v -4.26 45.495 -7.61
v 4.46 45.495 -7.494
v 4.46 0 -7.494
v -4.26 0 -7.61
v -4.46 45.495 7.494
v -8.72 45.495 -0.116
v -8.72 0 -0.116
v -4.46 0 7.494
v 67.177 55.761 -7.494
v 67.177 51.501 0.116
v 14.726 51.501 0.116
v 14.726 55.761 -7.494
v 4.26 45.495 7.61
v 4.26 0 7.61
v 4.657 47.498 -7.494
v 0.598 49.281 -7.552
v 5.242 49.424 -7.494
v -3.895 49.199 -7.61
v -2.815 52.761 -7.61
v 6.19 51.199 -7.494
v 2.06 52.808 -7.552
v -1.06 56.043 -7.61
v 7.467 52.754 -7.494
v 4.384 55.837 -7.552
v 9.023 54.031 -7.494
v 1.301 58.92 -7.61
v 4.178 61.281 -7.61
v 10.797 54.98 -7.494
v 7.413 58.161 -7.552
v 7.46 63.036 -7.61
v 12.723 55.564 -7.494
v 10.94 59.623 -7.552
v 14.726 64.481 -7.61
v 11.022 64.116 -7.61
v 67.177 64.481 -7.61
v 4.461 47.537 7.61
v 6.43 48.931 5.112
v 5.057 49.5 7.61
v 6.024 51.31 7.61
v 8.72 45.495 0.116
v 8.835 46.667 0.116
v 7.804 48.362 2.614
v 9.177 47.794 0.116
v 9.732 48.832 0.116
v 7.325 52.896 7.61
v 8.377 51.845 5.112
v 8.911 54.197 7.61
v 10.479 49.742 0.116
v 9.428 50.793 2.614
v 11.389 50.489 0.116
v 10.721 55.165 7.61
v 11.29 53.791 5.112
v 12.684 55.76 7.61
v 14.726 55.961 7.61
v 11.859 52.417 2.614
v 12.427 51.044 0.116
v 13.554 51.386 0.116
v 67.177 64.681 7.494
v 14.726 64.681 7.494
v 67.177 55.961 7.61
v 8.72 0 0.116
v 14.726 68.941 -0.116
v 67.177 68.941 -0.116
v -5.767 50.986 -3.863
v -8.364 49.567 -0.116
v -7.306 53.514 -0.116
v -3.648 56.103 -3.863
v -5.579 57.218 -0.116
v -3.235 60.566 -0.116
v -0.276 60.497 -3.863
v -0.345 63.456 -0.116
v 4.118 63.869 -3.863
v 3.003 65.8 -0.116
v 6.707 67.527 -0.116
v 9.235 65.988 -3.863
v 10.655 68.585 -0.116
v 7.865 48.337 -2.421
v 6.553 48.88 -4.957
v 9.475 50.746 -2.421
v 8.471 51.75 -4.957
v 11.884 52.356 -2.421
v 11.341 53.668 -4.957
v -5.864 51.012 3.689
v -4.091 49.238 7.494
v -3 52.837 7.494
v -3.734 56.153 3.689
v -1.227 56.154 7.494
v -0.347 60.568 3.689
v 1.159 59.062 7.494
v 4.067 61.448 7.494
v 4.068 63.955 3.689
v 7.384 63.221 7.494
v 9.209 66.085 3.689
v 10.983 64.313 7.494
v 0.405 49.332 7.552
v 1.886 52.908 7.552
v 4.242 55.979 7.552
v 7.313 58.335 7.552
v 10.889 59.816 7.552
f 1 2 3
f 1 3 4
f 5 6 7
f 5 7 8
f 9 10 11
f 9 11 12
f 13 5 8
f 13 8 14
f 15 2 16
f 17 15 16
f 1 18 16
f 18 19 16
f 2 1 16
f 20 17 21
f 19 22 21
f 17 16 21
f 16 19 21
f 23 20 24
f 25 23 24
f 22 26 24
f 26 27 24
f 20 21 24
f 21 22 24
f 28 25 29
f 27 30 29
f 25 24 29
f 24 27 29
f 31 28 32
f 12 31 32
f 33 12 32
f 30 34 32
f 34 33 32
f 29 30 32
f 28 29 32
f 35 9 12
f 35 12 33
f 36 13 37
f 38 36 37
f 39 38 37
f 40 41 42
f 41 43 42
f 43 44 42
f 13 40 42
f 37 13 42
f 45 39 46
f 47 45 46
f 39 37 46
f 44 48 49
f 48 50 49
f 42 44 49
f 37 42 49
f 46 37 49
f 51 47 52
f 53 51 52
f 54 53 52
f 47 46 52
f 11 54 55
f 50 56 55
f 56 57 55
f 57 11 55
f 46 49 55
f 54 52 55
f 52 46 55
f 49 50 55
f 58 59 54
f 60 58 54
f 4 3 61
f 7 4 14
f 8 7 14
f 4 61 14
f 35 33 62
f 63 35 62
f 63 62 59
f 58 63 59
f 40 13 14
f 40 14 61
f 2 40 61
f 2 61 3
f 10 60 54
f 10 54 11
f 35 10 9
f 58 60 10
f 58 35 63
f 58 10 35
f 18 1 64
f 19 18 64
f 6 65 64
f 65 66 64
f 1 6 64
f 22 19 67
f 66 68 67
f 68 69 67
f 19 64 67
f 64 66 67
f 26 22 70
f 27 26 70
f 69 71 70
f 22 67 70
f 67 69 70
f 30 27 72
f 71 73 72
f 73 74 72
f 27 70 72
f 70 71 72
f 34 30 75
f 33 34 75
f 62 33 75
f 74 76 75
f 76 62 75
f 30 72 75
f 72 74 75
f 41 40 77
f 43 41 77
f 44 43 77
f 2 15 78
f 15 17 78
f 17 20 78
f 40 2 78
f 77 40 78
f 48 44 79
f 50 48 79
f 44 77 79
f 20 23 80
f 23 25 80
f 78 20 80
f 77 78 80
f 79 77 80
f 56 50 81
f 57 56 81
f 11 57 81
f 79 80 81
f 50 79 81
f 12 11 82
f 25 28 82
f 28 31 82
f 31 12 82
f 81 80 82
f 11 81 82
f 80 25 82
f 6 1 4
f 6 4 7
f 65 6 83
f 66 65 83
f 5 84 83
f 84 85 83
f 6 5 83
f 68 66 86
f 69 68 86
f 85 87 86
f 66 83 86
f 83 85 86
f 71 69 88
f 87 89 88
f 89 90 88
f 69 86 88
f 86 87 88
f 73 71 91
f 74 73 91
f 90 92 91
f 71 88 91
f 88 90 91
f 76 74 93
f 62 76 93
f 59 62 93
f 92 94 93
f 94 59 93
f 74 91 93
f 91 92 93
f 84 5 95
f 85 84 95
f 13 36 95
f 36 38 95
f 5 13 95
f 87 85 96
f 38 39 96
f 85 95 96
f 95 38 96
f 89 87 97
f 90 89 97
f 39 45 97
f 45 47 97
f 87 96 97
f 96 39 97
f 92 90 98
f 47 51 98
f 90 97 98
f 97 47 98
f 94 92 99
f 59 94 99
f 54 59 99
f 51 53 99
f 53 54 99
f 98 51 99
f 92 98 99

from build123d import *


with BuildPart() as part:
    # 扫描1: sweep along a path in 草图2
    with BuildLine(Plane.XY) as sweep_1_path:
        Line((0, 0), (0, 45.495221089))
        ThreePointArc((0, 45.495221089), (4.31309835, 55.907961623), (14.725838884, 60.221059973))
        Line((14.725838884, 60.221059973), (67.177001903, 60.221059973))
    # 草图3 → 扫描1 (sweep)
    with BuildSketch(Plane(origin=(0, 0, 0), x_dir=(1, 0, 0), z_dir=(0, 1, 0))):
        Polygon((4.259864643, -7.609541104), (8.719988229, -0.115619555), (4.460123586, 7.49392155), (-4.259864643, 7.609541104), (-8.719988229, 0.115619555), (-4.460123586, -7.49392155), align=None)
    sweep(path=sweep_1_path.line)


solid = part.part
